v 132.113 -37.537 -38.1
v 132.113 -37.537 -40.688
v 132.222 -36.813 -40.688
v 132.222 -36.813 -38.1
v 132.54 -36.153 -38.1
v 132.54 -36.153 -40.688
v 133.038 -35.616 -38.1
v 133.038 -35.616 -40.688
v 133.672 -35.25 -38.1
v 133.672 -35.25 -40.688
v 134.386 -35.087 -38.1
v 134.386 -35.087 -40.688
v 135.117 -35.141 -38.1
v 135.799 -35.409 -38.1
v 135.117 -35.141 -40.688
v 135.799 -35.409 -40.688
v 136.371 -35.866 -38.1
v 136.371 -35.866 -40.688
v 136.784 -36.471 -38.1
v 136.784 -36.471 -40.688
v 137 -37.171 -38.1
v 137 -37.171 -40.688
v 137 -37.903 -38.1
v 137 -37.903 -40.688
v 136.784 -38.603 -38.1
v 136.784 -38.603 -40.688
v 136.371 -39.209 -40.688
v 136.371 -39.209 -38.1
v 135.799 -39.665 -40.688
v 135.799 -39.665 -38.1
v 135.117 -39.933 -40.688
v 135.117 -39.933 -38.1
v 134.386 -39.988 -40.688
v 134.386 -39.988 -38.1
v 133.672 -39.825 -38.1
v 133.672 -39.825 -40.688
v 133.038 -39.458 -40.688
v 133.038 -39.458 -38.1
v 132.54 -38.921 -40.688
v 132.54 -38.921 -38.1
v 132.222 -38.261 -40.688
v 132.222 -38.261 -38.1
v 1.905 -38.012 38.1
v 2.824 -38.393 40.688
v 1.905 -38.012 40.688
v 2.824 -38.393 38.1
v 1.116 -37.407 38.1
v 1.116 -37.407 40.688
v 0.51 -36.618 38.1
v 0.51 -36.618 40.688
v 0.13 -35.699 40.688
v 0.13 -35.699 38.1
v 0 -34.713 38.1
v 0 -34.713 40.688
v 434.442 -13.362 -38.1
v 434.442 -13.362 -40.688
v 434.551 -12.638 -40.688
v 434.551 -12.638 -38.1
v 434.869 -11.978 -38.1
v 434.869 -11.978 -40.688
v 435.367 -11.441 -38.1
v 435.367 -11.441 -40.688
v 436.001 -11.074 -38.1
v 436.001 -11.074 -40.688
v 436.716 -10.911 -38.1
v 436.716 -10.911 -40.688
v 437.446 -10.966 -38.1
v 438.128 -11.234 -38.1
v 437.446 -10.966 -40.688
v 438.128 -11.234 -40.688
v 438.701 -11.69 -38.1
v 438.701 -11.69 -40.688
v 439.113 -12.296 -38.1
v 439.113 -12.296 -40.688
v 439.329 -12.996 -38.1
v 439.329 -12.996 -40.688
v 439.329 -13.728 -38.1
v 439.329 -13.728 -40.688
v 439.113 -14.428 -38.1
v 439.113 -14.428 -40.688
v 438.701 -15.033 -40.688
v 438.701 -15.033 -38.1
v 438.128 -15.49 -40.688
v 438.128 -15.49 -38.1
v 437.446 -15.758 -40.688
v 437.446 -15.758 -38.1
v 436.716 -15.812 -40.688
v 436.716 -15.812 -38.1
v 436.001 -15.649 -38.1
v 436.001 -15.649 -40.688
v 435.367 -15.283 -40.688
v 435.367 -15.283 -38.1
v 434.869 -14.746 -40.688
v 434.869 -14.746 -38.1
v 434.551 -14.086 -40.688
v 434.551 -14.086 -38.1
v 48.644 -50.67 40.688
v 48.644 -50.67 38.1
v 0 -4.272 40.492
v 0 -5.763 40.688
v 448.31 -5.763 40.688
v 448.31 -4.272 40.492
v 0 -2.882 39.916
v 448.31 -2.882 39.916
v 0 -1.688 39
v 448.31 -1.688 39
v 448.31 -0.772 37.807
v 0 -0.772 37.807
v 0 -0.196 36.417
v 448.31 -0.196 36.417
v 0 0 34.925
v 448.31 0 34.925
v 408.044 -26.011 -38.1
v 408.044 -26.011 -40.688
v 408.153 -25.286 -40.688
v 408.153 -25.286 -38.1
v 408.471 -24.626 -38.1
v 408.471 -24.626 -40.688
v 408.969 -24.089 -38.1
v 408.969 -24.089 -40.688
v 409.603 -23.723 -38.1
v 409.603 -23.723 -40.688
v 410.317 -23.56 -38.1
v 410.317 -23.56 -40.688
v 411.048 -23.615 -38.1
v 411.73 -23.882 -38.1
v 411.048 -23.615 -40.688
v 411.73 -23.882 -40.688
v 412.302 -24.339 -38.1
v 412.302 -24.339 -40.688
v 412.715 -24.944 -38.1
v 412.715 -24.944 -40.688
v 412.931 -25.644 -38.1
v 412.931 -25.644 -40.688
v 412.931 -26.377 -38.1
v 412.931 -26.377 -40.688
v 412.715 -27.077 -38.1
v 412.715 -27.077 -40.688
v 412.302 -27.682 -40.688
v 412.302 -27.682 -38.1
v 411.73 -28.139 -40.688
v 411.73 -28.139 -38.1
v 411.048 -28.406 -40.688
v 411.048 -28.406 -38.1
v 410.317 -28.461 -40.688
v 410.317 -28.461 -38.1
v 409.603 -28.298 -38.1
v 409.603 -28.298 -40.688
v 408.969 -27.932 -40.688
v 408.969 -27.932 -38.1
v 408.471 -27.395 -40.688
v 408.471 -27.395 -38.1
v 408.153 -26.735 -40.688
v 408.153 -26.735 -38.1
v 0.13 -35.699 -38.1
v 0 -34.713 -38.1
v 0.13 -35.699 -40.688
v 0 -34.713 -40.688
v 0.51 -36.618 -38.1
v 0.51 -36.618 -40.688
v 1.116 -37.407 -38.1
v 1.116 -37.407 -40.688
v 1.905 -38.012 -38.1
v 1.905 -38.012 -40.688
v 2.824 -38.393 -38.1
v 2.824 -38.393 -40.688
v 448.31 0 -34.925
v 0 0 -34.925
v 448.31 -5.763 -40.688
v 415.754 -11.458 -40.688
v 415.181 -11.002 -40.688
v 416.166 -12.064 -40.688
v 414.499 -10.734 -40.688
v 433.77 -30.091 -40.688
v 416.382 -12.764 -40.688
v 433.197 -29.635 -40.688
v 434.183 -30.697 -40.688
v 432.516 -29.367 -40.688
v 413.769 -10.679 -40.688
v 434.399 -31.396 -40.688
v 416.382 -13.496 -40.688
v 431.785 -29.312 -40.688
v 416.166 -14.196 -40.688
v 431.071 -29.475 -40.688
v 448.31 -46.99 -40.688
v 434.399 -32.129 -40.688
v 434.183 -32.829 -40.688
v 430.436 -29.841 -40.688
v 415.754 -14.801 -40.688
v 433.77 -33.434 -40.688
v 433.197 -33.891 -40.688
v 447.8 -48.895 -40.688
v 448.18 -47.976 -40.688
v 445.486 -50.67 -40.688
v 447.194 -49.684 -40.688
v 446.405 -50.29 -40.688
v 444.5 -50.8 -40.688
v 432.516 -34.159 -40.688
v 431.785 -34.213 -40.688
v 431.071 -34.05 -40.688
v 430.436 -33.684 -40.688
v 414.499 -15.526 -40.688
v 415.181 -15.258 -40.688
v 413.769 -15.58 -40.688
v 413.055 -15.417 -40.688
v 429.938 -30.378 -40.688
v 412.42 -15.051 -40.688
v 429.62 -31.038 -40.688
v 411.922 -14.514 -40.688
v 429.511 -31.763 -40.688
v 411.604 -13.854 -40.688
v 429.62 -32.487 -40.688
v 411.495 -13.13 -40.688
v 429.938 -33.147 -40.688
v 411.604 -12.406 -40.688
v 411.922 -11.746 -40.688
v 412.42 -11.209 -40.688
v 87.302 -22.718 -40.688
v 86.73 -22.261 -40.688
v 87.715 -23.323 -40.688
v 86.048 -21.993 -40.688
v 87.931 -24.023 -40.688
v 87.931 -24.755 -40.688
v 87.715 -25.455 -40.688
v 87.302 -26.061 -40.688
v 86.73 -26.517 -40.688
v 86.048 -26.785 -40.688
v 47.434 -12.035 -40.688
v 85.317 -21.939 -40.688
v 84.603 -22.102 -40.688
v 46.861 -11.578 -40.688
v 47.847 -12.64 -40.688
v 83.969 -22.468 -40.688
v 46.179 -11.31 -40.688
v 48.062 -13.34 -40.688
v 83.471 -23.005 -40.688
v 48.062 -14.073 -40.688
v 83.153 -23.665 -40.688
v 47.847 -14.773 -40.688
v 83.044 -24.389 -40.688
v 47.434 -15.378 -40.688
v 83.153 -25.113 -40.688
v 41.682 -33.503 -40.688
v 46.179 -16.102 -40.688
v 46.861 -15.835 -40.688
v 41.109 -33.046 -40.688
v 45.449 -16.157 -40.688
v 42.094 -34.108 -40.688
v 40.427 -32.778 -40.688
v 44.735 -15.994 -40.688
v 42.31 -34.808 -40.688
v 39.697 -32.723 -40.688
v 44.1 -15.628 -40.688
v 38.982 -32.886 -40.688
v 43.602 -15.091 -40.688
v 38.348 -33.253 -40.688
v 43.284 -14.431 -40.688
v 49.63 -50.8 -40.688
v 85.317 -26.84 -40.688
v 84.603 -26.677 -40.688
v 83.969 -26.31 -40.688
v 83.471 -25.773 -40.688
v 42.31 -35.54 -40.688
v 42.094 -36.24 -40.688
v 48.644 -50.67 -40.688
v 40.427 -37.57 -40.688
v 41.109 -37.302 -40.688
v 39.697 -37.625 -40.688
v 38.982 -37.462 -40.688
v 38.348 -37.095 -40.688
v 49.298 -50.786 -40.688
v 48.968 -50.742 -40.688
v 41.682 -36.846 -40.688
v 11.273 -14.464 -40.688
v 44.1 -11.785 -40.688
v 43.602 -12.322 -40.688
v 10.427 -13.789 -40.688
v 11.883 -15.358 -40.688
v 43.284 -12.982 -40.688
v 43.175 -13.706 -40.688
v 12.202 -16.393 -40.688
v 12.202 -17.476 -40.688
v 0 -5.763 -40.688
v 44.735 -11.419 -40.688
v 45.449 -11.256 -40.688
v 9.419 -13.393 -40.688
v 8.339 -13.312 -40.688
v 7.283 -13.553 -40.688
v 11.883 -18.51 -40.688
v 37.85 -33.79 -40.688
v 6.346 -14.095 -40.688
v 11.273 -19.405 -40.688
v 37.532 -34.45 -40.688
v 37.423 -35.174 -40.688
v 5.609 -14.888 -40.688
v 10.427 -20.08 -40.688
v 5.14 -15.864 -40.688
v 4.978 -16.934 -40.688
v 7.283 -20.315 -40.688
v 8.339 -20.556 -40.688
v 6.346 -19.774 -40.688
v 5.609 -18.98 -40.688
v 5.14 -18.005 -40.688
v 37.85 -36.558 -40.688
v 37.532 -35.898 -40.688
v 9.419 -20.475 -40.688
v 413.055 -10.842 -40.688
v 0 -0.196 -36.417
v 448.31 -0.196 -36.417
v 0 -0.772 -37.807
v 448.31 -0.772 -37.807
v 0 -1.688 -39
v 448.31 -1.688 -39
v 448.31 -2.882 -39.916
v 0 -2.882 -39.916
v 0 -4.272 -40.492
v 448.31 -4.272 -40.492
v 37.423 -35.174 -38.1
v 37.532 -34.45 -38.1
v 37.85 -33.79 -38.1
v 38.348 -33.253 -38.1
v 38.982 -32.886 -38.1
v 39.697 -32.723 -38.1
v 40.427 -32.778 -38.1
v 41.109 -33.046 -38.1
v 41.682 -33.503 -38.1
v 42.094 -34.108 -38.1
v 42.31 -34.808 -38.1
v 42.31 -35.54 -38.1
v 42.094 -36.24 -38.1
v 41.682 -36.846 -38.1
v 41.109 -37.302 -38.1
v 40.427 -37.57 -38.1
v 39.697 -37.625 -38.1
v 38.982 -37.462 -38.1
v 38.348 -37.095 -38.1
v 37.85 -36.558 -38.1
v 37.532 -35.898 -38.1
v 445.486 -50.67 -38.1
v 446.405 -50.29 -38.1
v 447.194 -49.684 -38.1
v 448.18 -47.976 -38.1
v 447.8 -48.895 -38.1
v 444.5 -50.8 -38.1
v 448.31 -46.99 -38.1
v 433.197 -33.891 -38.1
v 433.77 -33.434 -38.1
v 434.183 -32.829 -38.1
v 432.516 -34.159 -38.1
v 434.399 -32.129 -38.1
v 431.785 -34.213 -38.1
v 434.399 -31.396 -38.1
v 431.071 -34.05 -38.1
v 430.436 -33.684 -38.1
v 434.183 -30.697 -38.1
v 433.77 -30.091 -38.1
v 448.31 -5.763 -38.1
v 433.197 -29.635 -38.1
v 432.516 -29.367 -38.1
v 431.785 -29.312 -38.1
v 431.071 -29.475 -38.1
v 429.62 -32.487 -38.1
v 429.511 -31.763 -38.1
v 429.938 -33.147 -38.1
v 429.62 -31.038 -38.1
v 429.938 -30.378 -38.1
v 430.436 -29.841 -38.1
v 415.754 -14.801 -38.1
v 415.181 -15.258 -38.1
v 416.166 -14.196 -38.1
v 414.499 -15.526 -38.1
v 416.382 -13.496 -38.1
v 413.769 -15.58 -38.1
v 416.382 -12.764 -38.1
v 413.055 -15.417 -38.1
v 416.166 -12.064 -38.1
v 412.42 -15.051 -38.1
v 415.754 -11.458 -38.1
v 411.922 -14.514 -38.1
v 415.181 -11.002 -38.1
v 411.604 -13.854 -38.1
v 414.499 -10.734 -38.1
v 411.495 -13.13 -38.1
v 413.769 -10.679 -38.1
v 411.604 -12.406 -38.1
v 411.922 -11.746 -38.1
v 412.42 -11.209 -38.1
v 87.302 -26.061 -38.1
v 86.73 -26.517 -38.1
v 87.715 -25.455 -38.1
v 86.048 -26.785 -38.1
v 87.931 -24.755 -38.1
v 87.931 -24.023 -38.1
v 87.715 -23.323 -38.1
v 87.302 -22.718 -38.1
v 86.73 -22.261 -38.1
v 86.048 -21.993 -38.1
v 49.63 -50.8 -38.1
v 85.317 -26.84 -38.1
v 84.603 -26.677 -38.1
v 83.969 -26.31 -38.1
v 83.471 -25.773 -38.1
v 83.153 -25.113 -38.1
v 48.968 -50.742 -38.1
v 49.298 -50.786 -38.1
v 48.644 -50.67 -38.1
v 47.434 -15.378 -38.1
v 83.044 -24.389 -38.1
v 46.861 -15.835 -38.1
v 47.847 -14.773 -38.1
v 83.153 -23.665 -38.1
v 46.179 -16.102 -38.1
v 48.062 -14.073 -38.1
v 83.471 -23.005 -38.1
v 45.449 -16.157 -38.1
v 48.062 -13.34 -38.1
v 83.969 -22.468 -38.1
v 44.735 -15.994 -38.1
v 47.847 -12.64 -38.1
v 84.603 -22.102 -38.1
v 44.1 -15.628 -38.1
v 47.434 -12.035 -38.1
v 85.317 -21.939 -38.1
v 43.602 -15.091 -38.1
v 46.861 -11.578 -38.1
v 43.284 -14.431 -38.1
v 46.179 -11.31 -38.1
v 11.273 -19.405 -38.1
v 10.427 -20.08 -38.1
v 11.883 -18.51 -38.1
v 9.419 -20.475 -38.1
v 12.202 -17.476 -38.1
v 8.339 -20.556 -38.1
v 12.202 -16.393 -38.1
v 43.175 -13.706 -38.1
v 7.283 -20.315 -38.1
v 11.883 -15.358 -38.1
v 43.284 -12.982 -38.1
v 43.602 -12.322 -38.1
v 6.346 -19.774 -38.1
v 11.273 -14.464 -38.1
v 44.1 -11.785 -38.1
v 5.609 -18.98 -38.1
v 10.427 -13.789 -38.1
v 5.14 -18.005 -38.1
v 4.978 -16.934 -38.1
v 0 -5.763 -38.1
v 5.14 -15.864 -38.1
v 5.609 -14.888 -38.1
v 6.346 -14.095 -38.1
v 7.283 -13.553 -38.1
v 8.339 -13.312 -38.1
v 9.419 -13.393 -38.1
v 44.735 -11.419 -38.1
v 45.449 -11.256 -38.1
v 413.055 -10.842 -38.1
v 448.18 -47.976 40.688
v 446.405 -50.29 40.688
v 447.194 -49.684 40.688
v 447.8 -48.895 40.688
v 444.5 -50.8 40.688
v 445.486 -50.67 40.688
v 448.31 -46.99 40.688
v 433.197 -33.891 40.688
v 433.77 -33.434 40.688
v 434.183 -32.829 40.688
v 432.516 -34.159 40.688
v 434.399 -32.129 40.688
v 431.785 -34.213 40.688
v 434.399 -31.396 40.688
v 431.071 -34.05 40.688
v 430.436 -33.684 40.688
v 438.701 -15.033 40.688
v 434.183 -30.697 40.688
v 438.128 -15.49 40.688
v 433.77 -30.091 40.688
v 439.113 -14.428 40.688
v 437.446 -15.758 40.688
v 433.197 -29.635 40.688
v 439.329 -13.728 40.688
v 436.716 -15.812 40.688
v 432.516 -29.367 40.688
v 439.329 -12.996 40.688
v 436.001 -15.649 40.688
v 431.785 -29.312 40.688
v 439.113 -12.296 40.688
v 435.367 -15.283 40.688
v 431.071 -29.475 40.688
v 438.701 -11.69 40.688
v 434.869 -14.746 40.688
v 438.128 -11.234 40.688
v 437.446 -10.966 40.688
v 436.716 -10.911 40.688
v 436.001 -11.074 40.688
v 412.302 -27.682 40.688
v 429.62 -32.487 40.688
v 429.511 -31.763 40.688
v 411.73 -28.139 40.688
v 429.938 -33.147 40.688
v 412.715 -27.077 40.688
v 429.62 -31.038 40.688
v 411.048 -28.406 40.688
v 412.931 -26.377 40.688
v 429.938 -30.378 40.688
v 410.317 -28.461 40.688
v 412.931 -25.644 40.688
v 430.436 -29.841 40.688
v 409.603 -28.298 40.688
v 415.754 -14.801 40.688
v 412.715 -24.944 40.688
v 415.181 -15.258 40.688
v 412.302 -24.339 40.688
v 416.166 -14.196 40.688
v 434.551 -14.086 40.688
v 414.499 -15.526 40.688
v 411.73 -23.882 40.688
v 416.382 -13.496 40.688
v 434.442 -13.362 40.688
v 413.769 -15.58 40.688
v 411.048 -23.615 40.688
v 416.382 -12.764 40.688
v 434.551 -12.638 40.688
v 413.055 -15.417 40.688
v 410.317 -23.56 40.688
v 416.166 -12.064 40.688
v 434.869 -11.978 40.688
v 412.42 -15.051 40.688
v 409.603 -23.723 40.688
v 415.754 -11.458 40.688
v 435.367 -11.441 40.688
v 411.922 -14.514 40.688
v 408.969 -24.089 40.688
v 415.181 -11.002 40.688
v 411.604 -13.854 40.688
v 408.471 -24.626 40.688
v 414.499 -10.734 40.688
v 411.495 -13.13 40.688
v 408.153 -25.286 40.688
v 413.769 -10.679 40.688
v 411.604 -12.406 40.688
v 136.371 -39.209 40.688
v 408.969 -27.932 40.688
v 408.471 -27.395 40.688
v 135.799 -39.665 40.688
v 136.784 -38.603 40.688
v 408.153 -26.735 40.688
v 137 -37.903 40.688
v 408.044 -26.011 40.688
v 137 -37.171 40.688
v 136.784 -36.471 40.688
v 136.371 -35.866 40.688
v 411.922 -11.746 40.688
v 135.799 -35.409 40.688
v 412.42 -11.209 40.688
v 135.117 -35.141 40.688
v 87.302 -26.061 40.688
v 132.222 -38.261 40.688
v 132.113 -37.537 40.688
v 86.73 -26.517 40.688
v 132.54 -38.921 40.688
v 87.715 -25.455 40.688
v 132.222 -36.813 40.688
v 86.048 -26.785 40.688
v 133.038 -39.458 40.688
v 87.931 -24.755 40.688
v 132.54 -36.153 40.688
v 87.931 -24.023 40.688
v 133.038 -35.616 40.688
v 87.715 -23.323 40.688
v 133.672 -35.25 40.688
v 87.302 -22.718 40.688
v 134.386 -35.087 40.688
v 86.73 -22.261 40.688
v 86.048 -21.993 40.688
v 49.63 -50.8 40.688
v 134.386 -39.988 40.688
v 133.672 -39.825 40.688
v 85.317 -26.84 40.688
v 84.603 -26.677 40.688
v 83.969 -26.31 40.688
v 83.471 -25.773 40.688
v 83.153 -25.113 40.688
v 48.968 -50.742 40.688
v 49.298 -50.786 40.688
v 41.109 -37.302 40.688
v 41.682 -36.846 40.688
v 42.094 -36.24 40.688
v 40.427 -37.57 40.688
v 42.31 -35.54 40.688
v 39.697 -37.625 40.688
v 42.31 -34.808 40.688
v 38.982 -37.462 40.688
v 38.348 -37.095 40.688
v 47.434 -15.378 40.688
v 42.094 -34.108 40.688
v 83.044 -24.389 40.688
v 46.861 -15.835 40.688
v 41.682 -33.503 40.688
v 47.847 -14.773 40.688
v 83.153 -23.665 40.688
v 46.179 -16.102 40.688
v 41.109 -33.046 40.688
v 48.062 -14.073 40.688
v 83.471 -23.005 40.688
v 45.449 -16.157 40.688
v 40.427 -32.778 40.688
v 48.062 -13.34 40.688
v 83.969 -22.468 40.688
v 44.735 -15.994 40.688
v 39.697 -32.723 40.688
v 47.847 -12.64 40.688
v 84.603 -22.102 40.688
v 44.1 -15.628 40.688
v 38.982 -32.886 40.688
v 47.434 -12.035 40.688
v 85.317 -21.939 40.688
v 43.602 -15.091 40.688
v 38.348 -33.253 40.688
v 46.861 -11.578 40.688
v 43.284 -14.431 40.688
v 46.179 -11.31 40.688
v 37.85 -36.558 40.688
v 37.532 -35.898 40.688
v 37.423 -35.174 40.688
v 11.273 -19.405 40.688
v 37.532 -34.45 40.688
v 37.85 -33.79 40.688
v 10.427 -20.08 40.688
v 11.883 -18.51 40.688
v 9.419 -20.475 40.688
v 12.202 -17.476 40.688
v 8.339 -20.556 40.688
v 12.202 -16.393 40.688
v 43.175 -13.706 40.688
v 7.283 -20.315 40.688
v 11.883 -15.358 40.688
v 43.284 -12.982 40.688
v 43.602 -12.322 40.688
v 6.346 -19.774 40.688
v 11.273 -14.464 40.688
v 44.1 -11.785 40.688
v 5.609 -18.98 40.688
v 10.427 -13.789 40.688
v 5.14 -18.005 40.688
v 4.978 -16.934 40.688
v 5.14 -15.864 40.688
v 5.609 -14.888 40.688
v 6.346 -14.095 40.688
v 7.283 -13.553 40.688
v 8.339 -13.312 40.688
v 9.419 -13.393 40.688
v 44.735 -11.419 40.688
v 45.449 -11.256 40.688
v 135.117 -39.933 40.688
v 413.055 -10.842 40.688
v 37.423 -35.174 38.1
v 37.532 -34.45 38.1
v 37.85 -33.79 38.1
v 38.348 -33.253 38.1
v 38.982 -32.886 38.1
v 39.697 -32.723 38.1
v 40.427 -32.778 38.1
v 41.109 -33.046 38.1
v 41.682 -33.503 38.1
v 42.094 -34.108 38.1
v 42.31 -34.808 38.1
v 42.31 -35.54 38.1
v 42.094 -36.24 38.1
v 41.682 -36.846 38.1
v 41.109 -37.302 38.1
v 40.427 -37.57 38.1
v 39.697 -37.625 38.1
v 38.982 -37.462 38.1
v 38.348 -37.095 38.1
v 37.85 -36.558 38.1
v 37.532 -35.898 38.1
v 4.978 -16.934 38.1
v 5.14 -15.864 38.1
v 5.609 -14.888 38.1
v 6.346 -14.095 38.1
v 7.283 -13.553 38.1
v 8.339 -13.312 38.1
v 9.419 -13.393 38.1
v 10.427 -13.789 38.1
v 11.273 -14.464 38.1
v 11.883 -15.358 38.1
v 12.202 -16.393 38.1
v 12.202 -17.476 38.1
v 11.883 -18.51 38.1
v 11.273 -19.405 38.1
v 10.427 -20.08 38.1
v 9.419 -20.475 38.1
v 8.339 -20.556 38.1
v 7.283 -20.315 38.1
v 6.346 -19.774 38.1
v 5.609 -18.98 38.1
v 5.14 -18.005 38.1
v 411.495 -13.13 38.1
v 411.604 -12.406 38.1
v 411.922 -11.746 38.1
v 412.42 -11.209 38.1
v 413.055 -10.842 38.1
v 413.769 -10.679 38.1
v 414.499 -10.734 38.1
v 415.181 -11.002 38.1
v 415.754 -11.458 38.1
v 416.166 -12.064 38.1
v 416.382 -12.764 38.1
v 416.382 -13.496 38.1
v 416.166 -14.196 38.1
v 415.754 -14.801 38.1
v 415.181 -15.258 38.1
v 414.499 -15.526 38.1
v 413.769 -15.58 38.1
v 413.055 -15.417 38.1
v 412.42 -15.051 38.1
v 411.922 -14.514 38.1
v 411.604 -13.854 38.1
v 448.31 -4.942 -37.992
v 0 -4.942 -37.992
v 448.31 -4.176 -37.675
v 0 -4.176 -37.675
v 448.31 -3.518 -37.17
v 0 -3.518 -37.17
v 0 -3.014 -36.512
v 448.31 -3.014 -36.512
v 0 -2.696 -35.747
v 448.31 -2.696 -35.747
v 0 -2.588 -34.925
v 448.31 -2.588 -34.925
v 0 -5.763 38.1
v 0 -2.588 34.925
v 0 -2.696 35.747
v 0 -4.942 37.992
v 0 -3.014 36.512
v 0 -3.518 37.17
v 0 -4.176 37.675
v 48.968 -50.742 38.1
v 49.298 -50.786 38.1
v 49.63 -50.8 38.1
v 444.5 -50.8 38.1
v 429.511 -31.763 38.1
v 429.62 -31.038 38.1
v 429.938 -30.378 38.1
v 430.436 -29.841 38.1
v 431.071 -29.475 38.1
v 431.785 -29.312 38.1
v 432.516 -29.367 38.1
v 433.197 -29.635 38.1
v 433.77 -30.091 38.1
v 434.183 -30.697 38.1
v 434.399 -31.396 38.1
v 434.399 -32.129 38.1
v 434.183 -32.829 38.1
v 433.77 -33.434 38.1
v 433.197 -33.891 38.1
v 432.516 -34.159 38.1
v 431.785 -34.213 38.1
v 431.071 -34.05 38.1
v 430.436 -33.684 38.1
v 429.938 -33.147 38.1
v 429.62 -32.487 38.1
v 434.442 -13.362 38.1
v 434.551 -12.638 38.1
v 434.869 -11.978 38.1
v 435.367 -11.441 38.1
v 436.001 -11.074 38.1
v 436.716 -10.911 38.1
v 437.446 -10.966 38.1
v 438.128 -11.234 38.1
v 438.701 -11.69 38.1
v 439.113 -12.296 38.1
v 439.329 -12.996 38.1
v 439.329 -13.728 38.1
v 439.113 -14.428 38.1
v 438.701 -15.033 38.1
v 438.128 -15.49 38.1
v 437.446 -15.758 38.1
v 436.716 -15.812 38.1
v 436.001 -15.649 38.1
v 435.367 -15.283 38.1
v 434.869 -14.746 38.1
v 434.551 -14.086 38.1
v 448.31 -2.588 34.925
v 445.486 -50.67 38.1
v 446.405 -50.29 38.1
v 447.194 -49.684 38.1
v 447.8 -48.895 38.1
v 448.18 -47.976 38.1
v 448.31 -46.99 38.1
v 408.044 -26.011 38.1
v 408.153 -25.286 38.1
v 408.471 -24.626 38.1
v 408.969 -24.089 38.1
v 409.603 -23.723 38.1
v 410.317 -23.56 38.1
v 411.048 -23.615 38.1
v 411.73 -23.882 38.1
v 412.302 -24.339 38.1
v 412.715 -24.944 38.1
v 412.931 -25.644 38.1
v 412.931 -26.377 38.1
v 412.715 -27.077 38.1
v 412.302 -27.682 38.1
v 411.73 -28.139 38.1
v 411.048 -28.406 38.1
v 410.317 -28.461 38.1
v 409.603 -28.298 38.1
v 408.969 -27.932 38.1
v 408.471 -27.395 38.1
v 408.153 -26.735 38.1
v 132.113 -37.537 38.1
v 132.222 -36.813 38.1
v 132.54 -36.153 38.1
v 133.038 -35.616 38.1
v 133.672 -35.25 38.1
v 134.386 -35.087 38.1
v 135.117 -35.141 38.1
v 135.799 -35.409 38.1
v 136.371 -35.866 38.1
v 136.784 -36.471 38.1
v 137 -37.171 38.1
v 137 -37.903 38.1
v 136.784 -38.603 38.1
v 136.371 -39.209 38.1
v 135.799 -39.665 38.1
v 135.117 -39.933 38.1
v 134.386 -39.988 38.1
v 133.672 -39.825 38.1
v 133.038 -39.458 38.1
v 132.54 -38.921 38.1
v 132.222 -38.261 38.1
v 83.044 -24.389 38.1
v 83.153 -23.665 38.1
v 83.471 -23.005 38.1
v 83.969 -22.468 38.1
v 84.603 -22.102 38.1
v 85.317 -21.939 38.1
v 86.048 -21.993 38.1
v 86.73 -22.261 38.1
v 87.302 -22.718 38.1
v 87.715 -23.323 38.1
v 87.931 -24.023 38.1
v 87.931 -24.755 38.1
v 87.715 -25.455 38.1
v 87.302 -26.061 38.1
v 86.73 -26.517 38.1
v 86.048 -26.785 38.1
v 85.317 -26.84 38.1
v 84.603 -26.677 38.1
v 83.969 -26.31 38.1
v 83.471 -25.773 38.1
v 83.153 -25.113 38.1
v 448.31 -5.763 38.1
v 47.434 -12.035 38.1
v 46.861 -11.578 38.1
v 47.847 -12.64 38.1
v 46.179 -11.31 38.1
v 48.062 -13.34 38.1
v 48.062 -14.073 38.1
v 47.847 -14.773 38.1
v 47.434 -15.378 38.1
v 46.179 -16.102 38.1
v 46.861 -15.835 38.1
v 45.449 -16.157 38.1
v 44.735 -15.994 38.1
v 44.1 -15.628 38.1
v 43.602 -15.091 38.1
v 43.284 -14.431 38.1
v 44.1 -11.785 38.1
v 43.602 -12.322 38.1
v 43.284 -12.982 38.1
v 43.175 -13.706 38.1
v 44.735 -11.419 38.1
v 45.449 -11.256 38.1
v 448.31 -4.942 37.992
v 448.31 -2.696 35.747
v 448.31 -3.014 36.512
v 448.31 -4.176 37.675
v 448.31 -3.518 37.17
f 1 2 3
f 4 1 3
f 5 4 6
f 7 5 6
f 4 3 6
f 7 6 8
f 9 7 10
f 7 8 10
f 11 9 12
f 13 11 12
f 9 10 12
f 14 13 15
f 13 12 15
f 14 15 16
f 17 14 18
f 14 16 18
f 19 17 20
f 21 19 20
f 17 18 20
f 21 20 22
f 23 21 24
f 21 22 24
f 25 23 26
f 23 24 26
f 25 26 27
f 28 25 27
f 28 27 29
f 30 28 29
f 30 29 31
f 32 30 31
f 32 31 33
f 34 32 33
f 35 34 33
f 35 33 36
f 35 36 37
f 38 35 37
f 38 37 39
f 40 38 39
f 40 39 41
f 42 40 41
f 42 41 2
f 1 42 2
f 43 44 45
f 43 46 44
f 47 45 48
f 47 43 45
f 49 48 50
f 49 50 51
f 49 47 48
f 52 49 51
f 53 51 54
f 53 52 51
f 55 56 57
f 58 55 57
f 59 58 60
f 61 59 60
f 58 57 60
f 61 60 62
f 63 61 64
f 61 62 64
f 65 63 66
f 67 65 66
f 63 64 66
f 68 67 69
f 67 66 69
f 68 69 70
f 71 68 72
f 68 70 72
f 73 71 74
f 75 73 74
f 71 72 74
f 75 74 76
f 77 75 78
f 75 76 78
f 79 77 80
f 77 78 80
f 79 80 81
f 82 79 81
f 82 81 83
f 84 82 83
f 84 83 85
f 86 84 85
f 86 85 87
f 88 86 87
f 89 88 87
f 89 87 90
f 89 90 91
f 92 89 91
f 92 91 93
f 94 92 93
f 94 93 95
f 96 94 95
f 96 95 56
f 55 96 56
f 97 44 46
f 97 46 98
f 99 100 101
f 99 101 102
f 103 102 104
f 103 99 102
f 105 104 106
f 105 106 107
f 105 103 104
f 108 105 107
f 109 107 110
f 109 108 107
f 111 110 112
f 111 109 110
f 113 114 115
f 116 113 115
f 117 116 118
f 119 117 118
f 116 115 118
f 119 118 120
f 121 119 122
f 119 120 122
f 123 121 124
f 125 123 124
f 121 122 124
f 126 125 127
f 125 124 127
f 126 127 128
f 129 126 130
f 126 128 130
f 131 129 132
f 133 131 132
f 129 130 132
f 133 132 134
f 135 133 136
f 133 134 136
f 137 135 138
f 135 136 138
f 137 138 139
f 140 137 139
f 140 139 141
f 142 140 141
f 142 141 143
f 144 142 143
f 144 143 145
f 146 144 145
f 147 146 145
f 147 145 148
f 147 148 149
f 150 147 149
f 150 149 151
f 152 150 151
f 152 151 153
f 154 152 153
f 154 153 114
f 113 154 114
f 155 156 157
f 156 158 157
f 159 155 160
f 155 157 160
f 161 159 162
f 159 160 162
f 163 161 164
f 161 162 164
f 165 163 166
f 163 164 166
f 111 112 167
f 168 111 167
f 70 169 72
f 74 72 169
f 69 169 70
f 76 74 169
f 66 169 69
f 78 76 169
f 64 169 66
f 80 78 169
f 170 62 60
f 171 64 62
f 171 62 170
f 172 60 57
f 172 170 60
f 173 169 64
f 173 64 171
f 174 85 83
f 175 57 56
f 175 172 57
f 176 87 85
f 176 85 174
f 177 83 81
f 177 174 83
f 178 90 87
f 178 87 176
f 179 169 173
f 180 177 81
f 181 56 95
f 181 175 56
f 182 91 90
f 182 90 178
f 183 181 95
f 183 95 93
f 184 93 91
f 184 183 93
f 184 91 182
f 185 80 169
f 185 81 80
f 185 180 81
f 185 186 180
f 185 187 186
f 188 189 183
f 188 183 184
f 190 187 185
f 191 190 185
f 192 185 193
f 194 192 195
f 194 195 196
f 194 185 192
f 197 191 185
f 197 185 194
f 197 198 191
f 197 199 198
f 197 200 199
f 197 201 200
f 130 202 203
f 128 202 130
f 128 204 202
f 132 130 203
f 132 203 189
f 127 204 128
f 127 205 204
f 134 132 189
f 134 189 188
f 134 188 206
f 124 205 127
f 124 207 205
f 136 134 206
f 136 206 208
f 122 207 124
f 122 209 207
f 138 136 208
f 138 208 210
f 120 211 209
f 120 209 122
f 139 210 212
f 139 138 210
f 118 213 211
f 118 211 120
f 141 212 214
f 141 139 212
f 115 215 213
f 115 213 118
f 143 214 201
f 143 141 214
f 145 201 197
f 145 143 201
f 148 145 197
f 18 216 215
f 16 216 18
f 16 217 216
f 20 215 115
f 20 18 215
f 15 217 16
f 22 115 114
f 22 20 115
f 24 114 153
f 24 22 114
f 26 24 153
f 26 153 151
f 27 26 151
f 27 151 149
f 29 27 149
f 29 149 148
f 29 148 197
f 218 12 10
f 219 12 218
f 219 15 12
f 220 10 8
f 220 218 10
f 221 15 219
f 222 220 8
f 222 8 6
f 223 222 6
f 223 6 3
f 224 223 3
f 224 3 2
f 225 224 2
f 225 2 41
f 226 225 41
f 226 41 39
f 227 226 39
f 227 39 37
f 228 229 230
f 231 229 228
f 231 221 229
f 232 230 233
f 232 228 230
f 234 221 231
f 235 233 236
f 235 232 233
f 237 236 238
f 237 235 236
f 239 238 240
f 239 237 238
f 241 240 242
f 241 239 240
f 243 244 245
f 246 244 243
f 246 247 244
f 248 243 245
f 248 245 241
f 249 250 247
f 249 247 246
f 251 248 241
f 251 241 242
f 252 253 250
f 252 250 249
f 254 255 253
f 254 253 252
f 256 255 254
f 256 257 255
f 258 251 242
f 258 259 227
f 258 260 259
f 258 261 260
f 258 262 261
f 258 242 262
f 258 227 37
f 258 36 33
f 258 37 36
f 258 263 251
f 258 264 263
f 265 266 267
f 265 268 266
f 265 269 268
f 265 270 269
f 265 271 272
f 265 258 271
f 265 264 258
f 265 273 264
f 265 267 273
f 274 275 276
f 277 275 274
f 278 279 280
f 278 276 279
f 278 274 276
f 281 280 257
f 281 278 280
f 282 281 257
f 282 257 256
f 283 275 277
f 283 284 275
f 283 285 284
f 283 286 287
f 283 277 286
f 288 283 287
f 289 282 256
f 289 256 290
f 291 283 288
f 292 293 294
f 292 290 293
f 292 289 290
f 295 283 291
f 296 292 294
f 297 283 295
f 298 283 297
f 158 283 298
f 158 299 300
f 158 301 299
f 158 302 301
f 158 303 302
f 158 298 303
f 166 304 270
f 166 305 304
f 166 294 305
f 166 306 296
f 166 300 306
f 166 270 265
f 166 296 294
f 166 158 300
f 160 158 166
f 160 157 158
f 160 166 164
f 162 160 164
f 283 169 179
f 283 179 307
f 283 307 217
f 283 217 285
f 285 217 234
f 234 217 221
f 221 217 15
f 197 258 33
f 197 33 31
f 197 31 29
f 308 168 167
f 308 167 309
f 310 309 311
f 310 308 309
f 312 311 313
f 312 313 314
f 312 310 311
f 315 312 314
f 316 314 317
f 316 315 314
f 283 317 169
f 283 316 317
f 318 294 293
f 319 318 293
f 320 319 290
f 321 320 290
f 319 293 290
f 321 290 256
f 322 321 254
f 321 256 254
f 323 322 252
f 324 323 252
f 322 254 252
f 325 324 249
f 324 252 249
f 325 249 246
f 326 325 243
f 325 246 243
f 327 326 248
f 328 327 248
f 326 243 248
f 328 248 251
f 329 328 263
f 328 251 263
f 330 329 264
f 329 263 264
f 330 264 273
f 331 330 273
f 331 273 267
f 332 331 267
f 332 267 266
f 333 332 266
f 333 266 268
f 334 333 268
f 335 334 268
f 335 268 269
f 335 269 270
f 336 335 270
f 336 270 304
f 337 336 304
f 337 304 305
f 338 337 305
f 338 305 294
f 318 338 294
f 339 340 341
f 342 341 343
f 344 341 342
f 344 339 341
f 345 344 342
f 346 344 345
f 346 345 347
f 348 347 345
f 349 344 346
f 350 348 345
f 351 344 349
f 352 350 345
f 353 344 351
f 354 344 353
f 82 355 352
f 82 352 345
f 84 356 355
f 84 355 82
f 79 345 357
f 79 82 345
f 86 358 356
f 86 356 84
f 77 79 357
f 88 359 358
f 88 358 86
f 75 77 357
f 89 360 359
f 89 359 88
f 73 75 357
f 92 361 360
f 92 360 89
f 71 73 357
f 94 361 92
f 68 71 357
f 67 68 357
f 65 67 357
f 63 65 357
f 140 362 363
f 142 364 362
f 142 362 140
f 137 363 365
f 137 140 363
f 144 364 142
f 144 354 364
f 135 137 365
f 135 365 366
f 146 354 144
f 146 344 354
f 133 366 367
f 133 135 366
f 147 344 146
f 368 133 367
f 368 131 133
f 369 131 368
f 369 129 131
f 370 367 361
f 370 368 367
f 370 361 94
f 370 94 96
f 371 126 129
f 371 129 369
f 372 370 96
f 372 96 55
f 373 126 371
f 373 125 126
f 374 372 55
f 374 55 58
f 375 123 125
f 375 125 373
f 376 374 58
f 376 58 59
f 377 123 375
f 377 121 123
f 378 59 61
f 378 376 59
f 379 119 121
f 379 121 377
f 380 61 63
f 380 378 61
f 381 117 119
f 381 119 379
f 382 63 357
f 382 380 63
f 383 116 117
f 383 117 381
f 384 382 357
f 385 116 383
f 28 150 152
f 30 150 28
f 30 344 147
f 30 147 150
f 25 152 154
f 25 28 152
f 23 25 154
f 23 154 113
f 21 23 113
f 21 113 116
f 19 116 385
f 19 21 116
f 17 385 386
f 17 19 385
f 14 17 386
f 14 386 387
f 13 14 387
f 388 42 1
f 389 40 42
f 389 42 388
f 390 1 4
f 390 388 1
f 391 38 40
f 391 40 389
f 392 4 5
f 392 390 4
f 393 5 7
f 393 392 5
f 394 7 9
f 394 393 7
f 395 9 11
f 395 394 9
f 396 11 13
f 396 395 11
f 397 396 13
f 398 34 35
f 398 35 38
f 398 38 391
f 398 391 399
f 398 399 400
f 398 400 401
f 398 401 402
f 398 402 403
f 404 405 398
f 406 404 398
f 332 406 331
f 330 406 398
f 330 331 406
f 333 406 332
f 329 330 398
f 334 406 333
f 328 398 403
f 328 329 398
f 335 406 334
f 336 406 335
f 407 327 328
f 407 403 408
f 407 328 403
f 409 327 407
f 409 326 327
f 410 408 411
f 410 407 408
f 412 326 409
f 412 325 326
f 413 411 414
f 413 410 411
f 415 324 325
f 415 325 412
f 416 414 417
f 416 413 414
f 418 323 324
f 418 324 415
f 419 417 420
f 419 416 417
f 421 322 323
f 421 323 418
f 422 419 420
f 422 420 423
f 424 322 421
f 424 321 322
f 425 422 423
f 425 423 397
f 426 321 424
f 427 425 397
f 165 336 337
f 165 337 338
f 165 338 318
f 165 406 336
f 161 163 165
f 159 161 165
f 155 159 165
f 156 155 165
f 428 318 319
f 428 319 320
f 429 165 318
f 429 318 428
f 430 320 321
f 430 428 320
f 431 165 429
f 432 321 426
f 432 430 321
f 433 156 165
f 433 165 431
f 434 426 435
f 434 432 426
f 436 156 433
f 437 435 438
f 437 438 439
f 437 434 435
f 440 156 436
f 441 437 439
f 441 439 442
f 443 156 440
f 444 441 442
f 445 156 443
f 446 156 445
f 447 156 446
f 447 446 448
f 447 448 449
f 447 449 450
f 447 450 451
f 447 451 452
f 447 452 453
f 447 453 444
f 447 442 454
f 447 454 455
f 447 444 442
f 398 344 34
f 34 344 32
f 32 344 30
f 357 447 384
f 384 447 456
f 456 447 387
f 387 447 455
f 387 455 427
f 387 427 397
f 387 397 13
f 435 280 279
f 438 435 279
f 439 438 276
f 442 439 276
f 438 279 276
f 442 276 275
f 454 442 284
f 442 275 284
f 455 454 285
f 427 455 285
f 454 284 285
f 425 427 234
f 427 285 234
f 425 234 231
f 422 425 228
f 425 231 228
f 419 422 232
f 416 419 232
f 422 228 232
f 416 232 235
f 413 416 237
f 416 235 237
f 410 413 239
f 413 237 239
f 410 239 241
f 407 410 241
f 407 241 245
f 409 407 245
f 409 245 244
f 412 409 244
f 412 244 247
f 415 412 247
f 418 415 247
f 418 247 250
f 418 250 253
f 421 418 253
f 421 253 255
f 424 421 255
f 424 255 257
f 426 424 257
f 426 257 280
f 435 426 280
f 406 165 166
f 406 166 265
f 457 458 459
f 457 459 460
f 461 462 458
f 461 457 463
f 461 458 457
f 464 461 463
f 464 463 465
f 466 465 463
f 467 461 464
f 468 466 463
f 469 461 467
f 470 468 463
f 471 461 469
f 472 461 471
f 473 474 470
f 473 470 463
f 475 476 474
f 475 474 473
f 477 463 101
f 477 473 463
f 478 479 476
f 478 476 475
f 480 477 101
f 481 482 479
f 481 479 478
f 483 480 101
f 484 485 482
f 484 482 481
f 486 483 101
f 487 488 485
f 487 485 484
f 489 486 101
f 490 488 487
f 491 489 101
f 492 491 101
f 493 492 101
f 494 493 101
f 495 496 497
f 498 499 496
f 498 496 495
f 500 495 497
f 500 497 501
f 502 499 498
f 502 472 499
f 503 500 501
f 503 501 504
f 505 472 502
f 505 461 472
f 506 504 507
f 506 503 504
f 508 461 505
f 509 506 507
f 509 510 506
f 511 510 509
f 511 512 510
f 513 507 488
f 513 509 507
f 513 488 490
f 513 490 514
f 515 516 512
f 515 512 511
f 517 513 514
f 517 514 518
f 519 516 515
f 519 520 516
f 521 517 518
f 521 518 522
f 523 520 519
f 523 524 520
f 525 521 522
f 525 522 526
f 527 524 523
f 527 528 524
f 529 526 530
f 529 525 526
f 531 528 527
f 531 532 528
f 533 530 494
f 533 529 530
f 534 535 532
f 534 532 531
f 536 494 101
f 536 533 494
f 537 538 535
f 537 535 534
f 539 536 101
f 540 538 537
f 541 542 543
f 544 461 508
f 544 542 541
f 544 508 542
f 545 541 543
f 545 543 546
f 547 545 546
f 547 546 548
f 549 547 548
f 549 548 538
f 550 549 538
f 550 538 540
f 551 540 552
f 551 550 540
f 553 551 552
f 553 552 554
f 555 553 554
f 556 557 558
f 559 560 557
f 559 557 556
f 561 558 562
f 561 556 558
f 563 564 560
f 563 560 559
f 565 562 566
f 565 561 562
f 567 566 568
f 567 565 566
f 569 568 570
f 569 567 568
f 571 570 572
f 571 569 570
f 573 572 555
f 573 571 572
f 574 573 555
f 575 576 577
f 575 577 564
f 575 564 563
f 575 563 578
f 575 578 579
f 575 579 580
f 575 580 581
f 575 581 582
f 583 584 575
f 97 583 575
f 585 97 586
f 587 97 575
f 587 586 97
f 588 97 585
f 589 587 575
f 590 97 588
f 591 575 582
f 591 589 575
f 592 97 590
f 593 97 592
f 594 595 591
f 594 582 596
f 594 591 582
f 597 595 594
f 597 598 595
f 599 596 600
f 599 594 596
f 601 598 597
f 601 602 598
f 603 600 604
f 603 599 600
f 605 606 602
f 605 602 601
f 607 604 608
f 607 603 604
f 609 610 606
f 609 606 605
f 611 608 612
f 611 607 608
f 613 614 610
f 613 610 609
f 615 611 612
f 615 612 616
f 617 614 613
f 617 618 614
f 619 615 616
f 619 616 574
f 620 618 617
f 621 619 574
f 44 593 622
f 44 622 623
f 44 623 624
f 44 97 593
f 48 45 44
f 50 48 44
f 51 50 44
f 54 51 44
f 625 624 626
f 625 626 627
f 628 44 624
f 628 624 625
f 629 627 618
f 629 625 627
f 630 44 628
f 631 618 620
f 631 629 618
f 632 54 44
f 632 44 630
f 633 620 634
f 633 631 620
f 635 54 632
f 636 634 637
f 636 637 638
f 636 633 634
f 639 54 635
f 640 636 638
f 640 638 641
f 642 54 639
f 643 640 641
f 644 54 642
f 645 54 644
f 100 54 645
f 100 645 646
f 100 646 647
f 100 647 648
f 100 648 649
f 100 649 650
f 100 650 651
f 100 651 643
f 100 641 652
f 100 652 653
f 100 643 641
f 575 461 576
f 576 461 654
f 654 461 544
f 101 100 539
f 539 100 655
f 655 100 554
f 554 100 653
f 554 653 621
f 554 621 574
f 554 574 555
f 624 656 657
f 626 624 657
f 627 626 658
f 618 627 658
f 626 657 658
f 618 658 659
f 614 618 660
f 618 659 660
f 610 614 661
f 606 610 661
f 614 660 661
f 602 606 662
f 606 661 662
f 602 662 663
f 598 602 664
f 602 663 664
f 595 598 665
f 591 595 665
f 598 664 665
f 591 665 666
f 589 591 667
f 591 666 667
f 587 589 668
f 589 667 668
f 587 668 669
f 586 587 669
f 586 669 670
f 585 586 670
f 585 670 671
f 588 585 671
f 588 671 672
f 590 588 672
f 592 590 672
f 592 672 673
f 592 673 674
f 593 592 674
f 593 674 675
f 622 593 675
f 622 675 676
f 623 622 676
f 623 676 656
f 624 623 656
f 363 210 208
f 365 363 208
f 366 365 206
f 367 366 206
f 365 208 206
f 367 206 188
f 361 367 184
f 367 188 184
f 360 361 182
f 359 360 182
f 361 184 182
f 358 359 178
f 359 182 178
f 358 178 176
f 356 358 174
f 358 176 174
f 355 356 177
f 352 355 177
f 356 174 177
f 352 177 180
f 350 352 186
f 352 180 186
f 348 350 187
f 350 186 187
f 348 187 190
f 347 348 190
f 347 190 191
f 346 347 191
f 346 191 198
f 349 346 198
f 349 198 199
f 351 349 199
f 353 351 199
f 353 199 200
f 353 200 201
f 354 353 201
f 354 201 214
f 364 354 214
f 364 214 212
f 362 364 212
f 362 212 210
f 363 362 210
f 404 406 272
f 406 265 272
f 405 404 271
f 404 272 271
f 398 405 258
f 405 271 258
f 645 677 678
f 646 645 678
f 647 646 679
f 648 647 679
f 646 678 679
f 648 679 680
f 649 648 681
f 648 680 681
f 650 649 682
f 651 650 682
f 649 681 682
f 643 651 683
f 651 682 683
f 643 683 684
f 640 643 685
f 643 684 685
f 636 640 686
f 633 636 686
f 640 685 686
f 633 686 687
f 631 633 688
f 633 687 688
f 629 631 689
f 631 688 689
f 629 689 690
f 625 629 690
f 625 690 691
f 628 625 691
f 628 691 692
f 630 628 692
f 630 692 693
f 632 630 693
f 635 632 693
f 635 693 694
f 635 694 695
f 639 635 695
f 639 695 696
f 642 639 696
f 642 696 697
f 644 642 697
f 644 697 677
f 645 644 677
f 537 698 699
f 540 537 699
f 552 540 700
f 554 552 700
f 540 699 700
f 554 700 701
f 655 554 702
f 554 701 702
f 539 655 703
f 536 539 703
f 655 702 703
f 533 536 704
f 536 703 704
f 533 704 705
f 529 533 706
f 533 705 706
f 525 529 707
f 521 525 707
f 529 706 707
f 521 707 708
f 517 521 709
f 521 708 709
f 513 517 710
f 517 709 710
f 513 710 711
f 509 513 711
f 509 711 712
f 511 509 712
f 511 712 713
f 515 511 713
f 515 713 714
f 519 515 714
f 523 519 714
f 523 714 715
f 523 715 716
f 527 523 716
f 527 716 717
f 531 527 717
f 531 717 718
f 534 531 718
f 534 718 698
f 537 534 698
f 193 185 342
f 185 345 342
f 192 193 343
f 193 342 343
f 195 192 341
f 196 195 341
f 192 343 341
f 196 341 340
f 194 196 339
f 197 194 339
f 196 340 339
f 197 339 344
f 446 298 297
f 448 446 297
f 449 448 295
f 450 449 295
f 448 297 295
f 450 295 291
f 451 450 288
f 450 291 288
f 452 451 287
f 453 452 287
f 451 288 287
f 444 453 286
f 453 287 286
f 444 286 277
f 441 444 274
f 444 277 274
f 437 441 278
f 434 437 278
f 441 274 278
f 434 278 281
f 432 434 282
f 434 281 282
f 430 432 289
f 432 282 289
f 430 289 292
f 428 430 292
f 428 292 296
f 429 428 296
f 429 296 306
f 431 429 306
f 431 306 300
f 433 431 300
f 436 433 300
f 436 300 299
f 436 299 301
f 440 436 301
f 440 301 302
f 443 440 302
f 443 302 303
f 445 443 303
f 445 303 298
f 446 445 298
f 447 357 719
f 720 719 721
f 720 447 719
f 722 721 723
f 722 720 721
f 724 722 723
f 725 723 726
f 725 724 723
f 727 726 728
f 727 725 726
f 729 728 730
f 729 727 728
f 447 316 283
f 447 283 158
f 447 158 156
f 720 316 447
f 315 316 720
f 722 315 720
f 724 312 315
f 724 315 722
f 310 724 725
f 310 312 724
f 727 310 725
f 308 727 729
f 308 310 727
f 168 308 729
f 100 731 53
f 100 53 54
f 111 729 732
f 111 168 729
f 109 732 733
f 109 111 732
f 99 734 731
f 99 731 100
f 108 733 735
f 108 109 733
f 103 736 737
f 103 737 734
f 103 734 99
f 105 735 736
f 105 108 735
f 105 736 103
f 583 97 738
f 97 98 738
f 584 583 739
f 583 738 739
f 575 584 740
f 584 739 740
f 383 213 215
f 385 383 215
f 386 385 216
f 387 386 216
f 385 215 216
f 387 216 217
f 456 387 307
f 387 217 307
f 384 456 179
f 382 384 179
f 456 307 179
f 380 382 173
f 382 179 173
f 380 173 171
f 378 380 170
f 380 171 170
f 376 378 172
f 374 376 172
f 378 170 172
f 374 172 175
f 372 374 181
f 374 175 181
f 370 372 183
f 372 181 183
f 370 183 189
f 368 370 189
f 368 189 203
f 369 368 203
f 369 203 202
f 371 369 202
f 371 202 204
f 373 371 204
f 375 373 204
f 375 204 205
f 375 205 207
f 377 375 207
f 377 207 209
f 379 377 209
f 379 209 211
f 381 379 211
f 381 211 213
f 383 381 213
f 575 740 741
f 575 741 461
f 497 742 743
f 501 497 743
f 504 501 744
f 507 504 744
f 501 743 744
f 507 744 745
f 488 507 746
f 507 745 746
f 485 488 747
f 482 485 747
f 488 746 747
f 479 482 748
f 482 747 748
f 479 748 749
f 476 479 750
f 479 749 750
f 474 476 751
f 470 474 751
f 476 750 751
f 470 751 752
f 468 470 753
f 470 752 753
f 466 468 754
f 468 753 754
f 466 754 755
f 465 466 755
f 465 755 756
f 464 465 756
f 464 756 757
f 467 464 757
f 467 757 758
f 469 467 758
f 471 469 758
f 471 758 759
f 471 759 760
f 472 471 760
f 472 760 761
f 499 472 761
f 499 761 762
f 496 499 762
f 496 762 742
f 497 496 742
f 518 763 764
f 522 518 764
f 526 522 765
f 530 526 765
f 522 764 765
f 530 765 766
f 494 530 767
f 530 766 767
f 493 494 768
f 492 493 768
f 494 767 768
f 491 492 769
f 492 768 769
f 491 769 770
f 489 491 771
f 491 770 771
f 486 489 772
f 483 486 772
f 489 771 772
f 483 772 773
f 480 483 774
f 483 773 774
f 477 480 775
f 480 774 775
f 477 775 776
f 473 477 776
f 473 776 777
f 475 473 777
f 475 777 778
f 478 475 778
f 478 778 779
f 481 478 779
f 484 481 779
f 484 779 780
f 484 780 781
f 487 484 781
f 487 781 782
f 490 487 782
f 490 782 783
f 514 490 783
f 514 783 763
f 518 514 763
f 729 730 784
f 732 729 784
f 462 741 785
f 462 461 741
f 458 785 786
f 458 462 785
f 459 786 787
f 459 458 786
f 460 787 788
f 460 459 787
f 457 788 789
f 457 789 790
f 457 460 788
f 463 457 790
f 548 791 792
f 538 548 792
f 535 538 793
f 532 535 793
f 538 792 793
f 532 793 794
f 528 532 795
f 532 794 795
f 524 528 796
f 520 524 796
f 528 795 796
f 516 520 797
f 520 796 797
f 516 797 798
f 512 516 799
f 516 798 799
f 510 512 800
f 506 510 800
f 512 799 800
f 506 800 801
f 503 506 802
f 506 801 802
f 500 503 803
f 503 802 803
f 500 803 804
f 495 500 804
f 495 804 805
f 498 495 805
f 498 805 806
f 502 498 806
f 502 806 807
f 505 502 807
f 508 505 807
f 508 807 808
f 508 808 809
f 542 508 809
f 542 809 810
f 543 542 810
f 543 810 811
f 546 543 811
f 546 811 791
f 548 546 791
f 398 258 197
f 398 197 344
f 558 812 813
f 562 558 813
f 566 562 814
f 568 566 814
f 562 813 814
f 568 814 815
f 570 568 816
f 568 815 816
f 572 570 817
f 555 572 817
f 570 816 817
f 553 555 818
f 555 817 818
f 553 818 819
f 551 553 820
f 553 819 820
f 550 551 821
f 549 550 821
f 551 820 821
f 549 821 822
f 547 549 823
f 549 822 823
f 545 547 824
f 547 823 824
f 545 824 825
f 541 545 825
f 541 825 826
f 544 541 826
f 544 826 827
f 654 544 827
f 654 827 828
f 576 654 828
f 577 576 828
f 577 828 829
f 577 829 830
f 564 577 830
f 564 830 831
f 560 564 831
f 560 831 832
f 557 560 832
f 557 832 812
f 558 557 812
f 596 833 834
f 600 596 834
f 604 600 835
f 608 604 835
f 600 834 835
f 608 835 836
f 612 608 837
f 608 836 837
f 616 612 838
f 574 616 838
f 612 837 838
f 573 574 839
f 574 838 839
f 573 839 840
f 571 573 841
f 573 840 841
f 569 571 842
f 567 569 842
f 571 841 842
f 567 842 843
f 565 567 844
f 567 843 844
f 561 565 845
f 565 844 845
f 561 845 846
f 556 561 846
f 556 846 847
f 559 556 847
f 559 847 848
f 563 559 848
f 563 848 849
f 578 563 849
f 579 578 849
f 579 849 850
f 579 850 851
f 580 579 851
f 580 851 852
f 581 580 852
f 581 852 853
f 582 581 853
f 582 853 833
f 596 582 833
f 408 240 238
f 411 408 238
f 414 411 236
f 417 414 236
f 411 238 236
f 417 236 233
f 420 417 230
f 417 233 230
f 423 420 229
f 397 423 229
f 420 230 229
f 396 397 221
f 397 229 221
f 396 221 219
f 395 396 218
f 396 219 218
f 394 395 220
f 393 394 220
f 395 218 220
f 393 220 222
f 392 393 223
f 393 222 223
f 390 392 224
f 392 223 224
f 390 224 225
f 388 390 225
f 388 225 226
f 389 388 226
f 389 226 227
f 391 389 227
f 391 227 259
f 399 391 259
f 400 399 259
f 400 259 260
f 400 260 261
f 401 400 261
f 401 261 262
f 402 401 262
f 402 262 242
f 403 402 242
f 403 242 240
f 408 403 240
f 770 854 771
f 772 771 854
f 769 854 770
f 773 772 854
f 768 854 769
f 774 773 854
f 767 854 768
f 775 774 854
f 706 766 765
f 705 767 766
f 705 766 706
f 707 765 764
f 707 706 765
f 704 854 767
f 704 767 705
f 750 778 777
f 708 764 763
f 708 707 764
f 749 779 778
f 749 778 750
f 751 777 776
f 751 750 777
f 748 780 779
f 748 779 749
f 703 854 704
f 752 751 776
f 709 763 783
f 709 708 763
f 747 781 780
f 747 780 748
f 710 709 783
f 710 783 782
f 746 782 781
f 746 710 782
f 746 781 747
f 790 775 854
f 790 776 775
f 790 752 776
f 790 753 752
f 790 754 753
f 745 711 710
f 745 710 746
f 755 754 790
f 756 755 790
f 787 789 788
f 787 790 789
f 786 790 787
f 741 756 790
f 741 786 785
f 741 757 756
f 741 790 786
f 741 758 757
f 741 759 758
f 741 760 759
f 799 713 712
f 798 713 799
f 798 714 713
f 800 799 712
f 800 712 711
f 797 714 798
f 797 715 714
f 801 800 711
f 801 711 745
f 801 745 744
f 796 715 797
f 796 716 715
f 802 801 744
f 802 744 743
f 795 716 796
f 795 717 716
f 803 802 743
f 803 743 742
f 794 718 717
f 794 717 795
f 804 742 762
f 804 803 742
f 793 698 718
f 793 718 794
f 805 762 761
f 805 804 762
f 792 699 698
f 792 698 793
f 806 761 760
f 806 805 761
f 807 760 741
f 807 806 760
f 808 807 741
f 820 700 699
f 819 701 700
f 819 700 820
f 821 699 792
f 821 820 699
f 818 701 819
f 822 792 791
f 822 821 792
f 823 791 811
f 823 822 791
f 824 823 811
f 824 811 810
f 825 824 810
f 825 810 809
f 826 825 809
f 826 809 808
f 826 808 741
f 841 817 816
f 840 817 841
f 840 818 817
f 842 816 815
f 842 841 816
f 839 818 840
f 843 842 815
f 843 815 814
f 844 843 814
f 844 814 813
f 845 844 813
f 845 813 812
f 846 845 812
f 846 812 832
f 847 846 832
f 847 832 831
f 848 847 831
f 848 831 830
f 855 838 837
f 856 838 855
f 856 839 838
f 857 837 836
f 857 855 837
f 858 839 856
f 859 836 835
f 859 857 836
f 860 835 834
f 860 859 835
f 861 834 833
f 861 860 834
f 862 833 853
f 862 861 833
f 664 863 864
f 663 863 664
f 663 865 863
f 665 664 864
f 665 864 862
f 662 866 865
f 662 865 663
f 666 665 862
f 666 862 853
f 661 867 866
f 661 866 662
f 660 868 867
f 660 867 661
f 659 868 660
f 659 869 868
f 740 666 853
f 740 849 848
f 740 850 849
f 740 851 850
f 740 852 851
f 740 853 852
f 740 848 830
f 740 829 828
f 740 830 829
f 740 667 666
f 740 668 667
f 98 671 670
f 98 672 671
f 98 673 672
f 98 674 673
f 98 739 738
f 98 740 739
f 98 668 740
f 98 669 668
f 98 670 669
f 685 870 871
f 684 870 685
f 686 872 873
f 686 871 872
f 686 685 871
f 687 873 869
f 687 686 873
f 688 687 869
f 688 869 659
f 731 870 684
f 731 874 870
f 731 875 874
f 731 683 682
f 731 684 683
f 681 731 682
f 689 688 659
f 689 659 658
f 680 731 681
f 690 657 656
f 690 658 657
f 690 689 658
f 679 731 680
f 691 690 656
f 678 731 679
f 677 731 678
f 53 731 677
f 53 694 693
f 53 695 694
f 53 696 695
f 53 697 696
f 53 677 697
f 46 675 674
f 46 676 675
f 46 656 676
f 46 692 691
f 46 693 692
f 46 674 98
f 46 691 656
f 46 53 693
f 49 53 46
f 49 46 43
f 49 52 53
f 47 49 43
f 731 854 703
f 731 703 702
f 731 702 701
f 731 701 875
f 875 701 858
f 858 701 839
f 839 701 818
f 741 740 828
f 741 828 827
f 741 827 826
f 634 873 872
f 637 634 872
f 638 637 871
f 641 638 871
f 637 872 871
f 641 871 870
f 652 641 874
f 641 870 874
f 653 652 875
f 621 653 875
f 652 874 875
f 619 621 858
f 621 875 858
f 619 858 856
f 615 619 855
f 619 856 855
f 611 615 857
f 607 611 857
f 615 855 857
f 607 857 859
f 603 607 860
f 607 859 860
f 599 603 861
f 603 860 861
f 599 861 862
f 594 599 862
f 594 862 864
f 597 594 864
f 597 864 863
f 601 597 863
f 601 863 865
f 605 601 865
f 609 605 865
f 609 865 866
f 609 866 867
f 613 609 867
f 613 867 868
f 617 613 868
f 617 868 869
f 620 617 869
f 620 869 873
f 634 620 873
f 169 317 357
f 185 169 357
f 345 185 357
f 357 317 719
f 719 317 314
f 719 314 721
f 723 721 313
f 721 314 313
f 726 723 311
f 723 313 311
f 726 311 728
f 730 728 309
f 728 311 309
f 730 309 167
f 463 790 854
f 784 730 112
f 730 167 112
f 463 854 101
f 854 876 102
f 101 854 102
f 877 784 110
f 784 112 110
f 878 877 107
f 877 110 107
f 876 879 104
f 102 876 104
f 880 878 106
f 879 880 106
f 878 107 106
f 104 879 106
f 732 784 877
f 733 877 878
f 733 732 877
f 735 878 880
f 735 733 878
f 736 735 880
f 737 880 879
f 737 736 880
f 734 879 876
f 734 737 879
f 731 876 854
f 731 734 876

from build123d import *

# Parameters (mm, degrees)
BASE_FLANGE1_DEPTH           = 448.31
CUT_EXTRUDE1_DEPTH           = 459.458977562
F_1_4_CLEARANCE_HOLE1_D      = 7.2644
F_10_0_1935_DIAMETER_HOLE1_D = 4.9149
FILLET1_R                    = 3.81


# Sheet-metal steps are written as plain solids
with BuildPart() as part:
    # Sketch2 → Base-Flange1 (new body)
    with BuildSketch(Plane(origin=(0, 0, 0), x_dir=(0, 0, -1), z_dir=(1, 0, 0))):
        with BuildLine():
            Line((-40.68826, -50.8), (-40.68826, -5.76326))
            ThreePointArc((-40.68826, -5.76326), (-39.000240228, -1.688019772), (-34.925, 0))
            Line((-34.925, 0), (34.925, 0))
            ThreePointArc((34.925, 0), (39.000240228, -1.688019772), (40.68826, -5.76326))
            Line((40.68826, -5.76326), (40.68826, -50.8))
            Line((40.68826, -50.8), (38.1, -50.8))
            Line((38.1, -50.8), (38.1, -5.76326))
            ThreePointArc((38.1, -5.76326), (37.17006403, -3.51819597), (34.925, -2.58826))
            Line((34.925, -2.58826), (-34.925, -2.58826))
            ThreePointArc((-34.925, -2.58826), (-37.17006403, -3.51819597), (-38.1, -5.76326))
            Line((-38.1, -5.76326), (-38.1, -50.8))
            Line((-38.1, -50.8), (-40.68826, -50.8))
        make_face()
    extrude(amount=BASE_FLANGE1_DEPTH)

    # Sketch8 → Cut-Extrude1 (cut, through all)
    with BuildSketch(Plane.XY.offset(40.68826)):
        Polygon((0, -37.636171444), (49.128076995, -50.8), (0, -50.8), align=None)
    extrude(amount=-CUT_EXTRUDE1_DEPTH, mode=Mode.SUBTRACT)

    # 1/4 Clearance Hole1 (through all)
    with Locations(Plane.XY.offset(40.68826)):
        with Locations((8.61046841, -16.934326391)):
            Hole(F_1_4_CLEARANCE_HOLE1_D / 2)

    # #10 (0.1935) Diameter Hole1 (through all)
    with Locations(Plane.XY.offset(40.68826)):
        with Locations((410.50096824, -26.010505082), (413.952320207, -13.129884188), (436.899172539, -13.361871369), (431.968669729, -31.762758359), (39.880176489, -35.174025037), (45.632429766, -13.706323547), (85.501018246, -24.389079634), (134.570050222, -37.537087125)):
            Hole(F_10_0_1935_DIAMETER_HOLE1_D / 2)

    # Fillet1
    fillet1_edges = [part.edges().sort_by_distance(p)[0] for p in [
        (448.31, -50.8, 39.39413),
        (49.128076995, -50.8, -39.39413),
        (0, -37.636171444, -39.39413),
        (0, -37.636171444, 39.39413),
        (49.128076995, -50.8, 39.39413),
        (448.31, -50.8, -39.39413),
    ]]
    fillet(fillet1_edges, radius=FILLET1_R)


solid = part.part
